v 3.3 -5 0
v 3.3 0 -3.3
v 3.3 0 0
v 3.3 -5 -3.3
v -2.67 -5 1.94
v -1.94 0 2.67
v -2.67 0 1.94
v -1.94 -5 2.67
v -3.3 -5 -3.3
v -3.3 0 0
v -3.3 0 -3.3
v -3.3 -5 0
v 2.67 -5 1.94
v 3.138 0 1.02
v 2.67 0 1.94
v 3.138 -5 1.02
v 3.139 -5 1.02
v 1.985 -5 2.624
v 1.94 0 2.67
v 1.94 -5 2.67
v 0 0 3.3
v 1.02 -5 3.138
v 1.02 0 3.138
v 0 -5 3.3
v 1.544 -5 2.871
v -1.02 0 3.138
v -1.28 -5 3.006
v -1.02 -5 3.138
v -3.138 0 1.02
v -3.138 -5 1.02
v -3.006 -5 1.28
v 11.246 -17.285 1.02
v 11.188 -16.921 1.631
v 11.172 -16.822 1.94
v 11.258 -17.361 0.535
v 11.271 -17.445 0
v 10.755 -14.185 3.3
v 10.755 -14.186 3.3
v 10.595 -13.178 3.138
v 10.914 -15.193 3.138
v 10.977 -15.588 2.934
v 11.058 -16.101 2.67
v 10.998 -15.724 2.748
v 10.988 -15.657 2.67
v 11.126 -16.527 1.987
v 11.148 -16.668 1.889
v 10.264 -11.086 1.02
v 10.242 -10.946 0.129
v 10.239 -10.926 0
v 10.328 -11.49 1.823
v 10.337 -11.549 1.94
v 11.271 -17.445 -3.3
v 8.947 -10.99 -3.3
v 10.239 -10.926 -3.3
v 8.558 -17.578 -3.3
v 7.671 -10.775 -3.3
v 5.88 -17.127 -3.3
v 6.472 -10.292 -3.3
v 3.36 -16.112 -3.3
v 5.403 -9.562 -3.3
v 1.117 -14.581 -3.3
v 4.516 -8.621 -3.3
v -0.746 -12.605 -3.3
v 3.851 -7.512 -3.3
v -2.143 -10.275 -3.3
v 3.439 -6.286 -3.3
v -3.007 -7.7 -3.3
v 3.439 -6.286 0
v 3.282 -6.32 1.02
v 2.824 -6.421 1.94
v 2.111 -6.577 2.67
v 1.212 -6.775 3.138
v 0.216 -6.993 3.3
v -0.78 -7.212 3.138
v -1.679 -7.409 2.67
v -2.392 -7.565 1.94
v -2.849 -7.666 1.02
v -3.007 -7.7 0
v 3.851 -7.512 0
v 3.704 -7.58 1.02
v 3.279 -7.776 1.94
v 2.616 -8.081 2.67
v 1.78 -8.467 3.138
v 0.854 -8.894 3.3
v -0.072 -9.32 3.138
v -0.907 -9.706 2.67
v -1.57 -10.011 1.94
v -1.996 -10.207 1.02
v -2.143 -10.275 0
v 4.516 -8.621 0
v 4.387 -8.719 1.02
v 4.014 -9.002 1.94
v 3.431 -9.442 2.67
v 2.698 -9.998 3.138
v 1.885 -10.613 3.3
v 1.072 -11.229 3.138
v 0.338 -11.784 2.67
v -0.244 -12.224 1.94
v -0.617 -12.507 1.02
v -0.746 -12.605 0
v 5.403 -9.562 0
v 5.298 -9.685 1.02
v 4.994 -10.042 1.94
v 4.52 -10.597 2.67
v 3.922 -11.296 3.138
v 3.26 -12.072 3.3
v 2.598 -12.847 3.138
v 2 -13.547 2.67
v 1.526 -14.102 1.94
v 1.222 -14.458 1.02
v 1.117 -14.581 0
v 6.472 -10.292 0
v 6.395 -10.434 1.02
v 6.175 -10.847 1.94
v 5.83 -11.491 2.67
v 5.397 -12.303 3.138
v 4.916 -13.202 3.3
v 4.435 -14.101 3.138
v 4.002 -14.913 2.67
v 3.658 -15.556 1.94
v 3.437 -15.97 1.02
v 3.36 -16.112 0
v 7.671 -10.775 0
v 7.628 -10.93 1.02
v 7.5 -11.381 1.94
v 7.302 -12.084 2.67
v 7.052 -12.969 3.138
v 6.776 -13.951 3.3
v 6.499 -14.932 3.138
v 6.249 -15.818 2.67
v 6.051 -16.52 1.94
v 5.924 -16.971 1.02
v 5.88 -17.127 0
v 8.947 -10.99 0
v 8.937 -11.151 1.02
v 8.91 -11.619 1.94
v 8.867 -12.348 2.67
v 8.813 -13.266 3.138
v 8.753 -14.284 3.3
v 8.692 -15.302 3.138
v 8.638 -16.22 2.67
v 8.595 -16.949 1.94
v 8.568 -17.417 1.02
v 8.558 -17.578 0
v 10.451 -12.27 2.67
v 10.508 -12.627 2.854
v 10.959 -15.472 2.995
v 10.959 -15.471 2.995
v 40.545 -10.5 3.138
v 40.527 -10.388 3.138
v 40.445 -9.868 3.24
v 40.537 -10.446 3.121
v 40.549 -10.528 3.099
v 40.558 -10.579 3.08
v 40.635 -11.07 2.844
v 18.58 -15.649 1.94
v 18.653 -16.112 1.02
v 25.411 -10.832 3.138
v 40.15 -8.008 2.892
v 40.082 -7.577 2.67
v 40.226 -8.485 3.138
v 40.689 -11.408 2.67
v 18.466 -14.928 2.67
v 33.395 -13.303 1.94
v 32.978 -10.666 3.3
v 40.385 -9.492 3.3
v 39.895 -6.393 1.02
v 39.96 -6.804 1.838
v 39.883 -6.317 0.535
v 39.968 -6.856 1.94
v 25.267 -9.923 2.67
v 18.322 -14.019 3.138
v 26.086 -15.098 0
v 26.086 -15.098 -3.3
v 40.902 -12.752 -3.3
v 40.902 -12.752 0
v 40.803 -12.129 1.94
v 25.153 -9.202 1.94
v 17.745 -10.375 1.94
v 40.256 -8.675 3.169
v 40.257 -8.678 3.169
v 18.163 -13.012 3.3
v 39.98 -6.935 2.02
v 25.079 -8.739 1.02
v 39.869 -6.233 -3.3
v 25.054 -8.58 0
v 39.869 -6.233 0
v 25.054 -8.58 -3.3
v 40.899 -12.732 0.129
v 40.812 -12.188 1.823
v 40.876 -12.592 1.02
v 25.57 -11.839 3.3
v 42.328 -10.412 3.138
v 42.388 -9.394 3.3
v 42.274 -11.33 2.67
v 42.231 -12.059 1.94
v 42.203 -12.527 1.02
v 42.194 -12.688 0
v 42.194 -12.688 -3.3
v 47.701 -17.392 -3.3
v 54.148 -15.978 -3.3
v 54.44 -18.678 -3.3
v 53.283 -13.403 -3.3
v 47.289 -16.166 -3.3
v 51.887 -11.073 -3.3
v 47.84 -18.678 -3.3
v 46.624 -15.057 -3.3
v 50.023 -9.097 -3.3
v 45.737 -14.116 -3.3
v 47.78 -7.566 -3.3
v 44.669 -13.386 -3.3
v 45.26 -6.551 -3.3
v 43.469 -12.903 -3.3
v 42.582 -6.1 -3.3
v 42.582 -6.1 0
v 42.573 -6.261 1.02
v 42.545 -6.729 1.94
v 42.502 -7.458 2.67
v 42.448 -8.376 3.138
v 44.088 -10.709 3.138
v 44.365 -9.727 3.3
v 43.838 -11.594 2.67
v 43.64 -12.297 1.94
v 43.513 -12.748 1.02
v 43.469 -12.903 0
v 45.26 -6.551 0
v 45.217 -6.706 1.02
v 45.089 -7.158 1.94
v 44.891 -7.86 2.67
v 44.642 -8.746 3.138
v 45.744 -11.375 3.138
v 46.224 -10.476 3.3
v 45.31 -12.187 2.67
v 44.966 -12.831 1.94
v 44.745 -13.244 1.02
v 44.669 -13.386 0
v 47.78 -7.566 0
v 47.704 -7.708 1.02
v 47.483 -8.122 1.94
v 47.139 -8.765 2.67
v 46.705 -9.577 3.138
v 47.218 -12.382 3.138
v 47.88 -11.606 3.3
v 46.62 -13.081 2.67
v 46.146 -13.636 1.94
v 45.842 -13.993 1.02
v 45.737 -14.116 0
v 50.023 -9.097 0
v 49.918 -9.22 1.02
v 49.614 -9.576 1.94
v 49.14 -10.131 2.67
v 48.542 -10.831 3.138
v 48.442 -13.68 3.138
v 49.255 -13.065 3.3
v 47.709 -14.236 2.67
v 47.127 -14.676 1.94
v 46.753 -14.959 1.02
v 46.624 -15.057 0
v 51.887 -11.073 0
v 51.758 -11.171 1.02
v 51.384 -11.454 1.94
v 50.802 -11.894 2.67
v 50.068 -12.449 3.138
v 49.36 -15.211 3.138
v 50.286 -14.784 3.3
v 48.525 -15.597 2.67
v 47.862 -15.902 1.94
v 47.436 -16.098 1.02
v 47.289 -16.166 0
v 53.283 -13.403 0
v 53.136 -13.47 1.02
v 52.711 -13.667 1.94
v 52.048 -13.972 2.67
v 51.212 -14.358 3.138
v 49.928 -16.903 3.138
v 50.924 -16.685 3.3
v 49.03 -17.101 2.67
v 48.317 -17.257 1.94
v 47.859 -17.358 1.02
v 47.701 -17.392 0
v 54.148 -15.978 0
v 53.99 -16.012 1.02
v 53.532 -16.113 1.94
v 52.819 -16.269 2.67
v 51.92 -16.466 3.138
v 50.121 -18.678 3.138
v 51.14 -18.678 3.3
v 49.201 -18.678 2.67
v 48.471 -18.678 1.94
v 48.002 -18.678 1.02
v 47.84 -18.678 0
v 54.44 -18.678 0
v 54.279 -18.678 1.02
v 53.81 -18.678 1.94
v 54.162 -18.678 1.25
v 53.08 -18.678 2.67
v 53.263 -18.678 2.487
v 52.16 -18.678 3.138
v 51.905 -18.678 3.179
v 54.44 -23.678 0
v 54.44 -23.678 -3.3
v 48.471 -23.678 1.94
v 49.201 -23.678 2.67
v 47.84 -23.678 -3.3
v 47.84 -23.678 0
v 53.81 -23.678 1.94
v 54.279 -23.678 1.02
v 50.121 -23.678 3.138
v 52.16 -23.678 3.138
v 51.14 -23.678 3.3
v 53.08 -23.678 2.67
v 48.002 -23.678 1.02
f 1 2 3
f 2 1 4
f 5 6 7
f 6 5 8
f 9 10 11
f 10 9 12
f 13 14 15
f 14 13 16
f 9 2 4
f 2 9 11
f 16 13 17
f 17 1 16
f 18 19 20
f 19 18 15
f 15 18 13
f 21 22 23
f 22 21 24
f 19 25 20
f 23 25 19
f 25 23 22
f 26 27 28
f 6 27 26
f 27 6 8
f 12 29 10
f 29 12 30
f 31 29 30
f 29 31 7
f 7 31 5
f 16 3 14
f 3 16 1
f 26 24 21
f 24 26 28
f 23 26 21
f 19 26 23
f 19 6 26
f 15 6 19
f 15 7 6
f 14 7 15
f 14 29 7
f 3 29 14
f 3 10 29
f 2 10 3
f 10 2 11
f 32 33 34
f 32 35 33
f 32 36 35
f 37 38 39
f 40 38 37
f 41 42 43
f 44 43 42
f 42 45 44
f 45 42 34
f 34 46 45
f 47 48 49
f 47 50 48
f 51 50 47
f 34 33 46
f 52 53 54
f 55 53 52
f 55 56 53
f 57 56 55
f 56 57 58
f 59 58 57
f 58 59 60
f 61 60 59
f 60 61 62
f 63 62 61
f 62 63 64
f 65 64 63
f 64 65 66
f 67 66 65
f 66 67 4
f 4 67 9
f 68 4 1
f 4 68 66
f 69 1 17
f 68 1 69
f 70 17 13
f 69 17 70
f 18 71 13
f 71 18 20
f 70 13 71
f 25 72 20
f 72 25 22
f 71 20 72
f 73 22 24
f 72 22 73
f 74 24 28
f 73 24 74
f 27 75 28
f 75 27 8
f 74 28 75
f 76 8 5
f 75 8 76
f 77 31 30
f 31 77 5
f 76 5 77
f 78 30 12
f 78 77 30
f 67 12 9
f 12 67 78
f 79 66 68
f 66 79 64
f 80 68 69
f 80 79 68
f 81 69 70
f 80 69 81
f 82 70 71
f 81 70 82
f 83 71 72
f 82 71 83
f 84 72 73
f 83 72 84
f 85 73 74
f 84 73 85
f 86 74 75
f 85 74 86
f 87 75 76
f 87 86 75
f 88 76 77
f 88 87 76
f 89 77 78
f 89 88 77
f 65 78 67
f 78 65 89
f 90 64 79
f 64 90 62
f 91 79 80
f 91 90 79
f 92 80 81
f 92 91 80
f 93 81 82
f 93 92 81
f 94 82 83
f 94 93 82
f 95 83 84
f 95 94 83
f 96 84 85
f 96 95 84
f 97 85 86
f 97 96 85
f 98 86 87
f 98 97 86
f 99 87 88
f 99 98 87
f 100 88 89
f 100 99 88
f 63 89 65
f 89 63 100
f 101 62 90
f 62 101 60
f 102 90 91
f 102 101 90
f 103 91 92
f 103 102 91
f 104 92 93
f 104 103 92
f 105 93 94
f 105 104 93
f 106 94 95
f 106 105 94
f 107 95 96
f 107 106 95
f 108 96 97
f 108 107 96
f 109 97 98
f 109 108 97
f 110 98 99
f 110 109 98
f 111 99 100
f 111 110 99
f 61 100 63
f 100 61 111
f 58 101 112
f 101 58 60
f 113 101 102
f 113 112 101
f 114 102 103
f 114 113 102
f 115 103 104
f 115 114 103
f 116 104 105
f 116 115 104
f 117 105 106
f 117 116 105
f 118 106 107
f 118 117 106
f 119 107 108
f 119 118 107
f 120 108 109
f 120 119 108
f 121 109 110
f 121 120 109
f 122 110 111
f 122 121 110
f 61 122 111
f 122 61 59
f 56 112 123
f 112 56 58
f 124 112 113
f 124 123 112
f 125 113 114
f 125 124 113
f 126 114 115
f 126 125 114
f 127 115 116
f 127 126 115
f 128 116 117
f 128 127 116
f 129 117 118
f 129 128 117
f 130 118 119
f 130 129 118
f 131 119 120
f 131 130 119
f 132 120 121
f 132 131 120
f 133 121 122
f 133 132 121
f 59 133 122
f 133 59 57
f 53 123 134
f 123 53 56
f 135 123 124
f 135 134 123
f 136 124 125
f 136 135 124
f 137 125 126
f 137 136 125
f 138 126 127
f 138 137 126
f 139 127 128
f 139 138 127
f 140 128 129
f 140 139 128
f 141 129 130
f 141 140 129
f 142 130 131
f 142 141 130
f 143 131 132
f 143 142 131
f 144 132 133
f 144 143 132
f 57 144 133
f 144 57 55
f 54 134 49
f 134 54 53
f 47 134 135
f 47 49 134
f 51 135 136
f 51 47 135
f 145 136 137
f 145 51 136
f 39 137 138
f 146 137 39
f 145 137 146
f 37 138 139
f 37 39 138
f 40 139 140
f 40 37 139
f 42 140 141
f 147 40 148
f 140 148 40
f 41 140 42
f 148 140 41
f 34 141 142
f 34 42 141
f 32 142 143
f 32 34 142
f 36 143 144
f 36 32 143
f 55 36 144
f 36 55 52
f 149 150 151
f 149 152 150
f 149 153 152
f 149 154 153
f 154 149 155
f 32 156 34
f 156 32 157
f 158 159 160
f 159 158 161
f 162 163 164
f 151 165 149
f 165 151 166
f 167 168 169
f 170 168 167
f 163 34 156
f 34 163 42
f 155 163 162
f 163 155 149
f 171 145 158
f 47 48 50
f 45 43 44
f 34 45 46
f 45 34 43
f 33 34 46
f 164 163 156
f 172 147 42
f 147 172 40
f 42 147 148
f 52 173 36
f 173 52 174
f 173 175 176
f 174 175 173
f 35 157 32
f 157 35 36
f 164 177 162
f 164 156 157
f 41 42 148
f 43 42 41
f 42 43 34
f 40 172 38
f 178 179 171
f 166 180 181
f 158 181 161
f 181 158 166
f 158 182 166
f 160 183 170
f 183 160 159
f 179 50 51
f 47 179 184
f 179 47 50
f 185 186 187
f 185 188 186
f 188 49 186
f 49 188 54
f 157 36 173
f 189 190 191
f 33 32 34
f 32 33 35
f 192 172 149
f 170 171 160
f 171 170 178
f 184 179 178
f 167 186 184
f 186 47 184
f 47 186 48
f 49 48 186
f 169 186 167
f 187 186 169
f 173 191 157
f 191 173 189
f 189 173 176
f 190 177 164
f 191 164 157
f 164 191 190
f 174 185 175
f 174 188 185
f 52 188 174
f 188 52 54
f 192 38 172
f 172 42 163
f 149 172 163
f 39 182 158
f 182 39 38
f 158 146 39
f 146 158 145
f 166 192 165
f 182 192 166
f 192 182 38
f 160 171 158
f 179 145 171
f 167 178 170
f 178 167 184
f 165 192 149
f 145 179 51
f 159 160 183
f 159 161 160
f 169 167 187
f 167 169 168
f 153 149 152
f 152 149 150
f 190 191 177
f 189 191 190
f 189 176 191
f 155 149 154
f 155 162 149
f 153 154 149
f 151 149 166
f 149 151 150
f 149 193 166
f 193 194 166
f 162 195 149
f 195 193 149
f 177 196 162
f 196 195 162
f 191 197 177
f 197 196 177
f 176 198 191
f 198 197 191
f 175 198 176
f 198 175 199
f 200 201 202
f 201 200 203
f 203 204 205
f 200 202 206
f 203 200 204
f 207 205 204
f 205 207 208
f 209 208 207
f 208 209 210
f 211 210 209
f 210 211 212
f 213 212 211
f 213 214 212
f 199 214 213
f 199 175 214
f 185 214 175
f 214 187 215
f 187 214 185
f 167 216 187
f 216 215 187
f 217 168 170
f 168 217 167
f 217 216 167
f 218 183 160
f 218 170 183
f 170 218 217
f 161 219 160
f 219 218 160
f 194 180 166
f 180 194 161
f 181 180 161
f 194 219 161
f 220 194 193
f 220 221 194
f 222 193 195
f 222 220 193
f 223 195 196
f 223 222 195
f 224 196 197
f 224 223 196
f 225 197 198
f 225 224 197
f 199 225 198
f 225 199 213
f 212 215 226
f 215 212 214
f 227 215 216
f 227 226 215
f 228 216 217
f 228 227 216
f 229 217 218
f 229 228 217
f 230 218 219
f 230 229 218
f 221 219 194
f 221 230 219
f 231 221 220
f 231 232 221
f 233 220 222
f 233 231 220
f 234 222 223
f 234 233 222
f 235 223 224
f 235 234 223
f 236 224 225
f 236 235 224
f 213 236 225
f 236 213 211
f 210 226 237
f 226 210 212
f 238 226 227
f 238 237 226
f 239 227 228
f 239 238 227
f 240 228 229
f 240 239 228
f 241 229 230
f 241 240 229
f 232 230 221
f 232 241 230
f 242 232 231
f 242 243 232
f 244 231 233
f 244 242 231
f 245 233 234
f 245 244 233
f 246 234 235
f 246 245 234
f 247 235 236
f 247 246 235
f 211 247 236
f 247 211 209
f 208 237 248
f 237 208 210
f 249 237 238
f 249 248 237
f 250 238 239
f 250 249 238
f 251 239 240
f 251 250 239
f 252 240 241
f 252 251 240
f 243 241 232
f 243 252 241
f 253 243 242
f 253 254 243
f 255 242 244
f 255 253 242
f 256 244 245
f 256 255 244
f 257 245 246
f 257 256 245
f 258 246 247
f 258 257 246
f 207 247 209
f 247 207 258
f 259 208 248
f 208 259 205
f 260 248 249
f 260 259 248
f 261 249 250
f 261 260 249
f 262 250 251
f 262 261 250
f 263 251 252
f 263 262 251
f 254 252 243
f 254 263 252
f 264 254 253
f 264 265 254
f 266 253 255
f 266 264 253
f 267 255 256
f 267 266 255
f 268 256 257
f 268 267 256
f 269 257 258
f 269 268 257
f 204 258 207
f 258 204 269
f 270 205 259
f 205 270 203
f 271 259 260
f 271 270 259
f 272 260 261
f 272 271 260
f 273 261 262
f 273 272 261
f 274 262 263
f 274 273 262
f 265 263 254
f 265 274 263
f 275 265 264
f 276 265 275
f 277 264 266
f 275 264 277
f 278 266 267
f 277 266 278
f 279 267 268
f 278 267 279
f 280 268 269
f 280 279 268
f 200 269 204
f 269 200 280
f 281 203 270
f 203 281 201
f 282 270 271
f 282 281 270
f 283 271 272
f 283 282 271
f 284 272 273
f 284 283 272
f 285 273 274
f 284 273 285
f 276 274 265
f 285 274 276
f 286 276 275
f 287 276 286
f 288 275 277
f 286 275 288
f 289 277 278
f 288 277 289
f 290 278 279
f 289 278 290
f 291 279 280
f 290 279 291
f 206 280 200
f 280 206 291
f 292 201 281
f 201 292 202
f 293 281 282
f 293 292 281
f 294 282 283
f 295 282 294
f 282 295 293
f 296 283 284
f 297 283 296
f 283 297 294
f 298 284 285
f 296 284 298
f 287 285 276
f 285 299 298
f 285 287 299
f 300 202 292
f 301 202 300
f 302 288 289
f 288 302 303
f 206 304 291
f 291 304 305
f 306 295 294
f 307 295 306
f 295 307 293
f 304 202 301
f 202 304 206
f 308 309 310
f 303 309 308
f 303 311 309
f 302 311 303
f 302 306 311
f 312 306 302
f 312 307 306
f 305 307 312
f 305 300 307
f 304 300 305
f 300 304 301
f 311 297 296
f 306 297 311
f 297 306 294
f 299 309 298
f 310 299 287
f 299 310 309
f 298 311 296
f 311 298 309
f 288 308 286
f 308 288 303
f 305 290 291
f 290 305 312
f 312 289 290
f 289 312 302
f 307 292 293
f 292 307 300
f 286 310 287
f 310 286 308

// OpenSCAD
// Start: lazy_union
default_5_default_5();
// End: lazy_union

// Modules.

// 'PartMaterial undef-default - default 5.0'
module default_5_default_5() {
  // 'None : _combine_solids_and_holes'
  union() {
    // 'default : _combine_solids_and_holes'
    union() {
      // 'wire_hole : _combine_solids_and_holes'
      union() {
        // ('item', 0)
        multmatrix(m=[[-1.0, -0.0, -0.0, -0.0], [0.0, 0.0, 1.0, -5.0], [0.0, 1.0, 0.0, 0.0], [0.0, 0.0, 0.0, 1.0]]) {
          // "('item', 0) : _combine_solids_and_holes"
          union() {
            // ('item', 0)
            linear_extrude(height=5.0, twist=0.0, slices=4, scale=[1.0, 1.0]) {
              polygon(points=[[0.0, 0.0], [-3.3, 0.0], [-3.1384865037740064, 1.0197560814373268], [-2.6697560814373262, 1.9396913325651617], [-1.9396913325651608, 2.6697560814373262], [-1.019756081437326, 3.138486503774007], [2.0206672185931328e-16, 3.3], [1.0197560814373265, 3.1384865037740064], [1.9396913325651612, 2.6697560814373262], [2.6697560814373262, 1.9396913325651612], [3.1384865037740064, 1.0197560814373263], [3.3, 0.0], [3.3, -3.2999999999999994], [-3.3, -3.2999999999999994], [-3.3, 4.440892098500626e-16]]);
            }
          }
        }
        // ('item', 1)
        multmatrix(m=[[-1.0, 0.0, 0.0, 9.3], [0.0, -1.0, 0.0, -5.0], [0.0, 0.0, 1.0, -3.2999999999999994], [0.0, 0.0, 0.0, 1.0]]) {
          // "('item', 1) : _combine_solids_and_holes"
          union() {
            // ('item', 1)
            rotate_extrude(angle=99.0, convexity=10) {
              polygon(points=[[9.3, 3.2999999999999994], [6.0, 3.2999999999999994], [6.161513496225993, 4.319756081437326], [6.630243918562674, 5.239691332565162], [7.36030866743484, 5.9697560814373265], [8.280243918562673, 6.438486503774007], [9.3, 6.6], [10.319756081437328, 6.438486503774007], [11.239691332565162, 5.9697560814373265], [11.969756081437328, 5.239691332565161], [12.438486503774008, 4.319756081437326], [12.600000000000001, 3.2999999999999994], [12.6, 0.0], [6.0, 0.0], [6.0, 3.3]]);
            }
          }
        }
        // ('item', 2)
        multmatrix(m=[[0.15643446504023104, 0.0, -0.9876883405951377, 40.38549074272828], [-0.9876883405951377, 0.0, -0.15643446504023104, -9.49246761632785], [0.0, 1.0, 0.0, 0.0], [0.0, 0.0, 0.0, 1.0]]) {
          // "('item', 2) : _combine_solids_and_holes"
          union() {
            // ('item', 2)
            linear_extrude(height=30.0, twist=0.0, slices=4, scale=[1.0, 1.0]) {
              polygon(points=[[0.0, 0.0], [-3.3, 0.0], [-3.1384865037740064, 1.0197560814373268], [-2.6697560814373262, 1.9396913325651617], [-1.9396913325651608, 2.6697560814373262], [-1.019756081437326, 3.138486503774007], [2.0206672185931328e-16, 3.3], [1.0197560814373265, 3.1384865037740064], [1.9396913325651612, 2.6697560814373262], [2.6697560814373262, 1.9396913325651612], [3.1384865037740064, 1.0197560814373263], [3.3, 0.0], [3.3, -3.2999999999999994], [-3.3, -3.2999999999999994], [-3.3, 4.440892098500626e-16]]);
            }
          }
        }
        // ('item', 3)
        multmatrix(m=[[-0.15643446504023104, 0.9876883405951377, 0.0, 41.84033126760243], [0.9876883405951377, 0.15643446504023104, 0.0, -18.67796918386263], [0.0, 0.0, -1.0, 4.440892098500626e-16], [0.0, 0.0, 0.0, 1.0]]) {
          // "('item', 3) : _combine_solids_and_holes"
          union() {
            // ('item', 3)
            rotate_extrude(angle=99.0, convexity=10) {
              polygon(points=[[9.3, 4.440892098500626e-16], [12.6, 4.440892098500626e-16], [12.438486503774007, -1.0197560814373257], [11.969756081437327, -1.9396913325651604], [11.239691332565162, -2.6697560814373253], [10.319756081437326, -3.138486503774005], [9.3, -3.2999999999999985], [8.280243918562675, -3.1384865037740055], [7.360308667434841, -2.6697560814373253], [6.630243918562675, -1.9396913325651606], [6.161513496225995, -1.019756081437326], [6.000000000000002, 3.9955766131436164e-17], [6.0, 3.3], [12.6, 3.3], [12.6, 0.0]]);
            }
          }
        }
        // ('item', 4)
        multmatrix(m=[[-0.9999999999999999, 0.0, 1.6155856225556147e-18, 51.14033126760243], [-1.6155856225556147e-18, 0.0, 0.9999999999999999, -23.67796918386263], [0.0, 1.0, 0.0, 0.0], [0.0, 0.0, 0.0, 1.0]]) {
          // "('item', 4) : _combine_solids_and_holes"
          union() {
            // ('item', 4)
            linear_extrude(height=5.0, twist=0.0, slices=4, scale=[1.0, 1.0]) {
              polygon(points=[[0.0, 0.0], [-3.3, 0.0], [-3.1384865037740064, 1.0197560814373268], [-2.6697560814373262, 1.9396913325651617], [-1.9396913325651608, 2.6697560814373262], [-1.019756081437326, 3.138486503774007], [2.0206672185931328e-16, 3.3], [1.0197560814373265, 3.1384865037740064], [1.9396913325651612, 2.6697560814373262], [2.6697560814373262, 1.9396913325651612], [3.1384865037740064, 1.0197560814373263], [3.3, 0.0], [3.3, -3.2999999999999994], [-3.3, -3.2999999999999994], [-3.3, 4.440892098500626e-16]]);
            }
          }
        }
      }
    }
  }
} // end module default_5_default_5
